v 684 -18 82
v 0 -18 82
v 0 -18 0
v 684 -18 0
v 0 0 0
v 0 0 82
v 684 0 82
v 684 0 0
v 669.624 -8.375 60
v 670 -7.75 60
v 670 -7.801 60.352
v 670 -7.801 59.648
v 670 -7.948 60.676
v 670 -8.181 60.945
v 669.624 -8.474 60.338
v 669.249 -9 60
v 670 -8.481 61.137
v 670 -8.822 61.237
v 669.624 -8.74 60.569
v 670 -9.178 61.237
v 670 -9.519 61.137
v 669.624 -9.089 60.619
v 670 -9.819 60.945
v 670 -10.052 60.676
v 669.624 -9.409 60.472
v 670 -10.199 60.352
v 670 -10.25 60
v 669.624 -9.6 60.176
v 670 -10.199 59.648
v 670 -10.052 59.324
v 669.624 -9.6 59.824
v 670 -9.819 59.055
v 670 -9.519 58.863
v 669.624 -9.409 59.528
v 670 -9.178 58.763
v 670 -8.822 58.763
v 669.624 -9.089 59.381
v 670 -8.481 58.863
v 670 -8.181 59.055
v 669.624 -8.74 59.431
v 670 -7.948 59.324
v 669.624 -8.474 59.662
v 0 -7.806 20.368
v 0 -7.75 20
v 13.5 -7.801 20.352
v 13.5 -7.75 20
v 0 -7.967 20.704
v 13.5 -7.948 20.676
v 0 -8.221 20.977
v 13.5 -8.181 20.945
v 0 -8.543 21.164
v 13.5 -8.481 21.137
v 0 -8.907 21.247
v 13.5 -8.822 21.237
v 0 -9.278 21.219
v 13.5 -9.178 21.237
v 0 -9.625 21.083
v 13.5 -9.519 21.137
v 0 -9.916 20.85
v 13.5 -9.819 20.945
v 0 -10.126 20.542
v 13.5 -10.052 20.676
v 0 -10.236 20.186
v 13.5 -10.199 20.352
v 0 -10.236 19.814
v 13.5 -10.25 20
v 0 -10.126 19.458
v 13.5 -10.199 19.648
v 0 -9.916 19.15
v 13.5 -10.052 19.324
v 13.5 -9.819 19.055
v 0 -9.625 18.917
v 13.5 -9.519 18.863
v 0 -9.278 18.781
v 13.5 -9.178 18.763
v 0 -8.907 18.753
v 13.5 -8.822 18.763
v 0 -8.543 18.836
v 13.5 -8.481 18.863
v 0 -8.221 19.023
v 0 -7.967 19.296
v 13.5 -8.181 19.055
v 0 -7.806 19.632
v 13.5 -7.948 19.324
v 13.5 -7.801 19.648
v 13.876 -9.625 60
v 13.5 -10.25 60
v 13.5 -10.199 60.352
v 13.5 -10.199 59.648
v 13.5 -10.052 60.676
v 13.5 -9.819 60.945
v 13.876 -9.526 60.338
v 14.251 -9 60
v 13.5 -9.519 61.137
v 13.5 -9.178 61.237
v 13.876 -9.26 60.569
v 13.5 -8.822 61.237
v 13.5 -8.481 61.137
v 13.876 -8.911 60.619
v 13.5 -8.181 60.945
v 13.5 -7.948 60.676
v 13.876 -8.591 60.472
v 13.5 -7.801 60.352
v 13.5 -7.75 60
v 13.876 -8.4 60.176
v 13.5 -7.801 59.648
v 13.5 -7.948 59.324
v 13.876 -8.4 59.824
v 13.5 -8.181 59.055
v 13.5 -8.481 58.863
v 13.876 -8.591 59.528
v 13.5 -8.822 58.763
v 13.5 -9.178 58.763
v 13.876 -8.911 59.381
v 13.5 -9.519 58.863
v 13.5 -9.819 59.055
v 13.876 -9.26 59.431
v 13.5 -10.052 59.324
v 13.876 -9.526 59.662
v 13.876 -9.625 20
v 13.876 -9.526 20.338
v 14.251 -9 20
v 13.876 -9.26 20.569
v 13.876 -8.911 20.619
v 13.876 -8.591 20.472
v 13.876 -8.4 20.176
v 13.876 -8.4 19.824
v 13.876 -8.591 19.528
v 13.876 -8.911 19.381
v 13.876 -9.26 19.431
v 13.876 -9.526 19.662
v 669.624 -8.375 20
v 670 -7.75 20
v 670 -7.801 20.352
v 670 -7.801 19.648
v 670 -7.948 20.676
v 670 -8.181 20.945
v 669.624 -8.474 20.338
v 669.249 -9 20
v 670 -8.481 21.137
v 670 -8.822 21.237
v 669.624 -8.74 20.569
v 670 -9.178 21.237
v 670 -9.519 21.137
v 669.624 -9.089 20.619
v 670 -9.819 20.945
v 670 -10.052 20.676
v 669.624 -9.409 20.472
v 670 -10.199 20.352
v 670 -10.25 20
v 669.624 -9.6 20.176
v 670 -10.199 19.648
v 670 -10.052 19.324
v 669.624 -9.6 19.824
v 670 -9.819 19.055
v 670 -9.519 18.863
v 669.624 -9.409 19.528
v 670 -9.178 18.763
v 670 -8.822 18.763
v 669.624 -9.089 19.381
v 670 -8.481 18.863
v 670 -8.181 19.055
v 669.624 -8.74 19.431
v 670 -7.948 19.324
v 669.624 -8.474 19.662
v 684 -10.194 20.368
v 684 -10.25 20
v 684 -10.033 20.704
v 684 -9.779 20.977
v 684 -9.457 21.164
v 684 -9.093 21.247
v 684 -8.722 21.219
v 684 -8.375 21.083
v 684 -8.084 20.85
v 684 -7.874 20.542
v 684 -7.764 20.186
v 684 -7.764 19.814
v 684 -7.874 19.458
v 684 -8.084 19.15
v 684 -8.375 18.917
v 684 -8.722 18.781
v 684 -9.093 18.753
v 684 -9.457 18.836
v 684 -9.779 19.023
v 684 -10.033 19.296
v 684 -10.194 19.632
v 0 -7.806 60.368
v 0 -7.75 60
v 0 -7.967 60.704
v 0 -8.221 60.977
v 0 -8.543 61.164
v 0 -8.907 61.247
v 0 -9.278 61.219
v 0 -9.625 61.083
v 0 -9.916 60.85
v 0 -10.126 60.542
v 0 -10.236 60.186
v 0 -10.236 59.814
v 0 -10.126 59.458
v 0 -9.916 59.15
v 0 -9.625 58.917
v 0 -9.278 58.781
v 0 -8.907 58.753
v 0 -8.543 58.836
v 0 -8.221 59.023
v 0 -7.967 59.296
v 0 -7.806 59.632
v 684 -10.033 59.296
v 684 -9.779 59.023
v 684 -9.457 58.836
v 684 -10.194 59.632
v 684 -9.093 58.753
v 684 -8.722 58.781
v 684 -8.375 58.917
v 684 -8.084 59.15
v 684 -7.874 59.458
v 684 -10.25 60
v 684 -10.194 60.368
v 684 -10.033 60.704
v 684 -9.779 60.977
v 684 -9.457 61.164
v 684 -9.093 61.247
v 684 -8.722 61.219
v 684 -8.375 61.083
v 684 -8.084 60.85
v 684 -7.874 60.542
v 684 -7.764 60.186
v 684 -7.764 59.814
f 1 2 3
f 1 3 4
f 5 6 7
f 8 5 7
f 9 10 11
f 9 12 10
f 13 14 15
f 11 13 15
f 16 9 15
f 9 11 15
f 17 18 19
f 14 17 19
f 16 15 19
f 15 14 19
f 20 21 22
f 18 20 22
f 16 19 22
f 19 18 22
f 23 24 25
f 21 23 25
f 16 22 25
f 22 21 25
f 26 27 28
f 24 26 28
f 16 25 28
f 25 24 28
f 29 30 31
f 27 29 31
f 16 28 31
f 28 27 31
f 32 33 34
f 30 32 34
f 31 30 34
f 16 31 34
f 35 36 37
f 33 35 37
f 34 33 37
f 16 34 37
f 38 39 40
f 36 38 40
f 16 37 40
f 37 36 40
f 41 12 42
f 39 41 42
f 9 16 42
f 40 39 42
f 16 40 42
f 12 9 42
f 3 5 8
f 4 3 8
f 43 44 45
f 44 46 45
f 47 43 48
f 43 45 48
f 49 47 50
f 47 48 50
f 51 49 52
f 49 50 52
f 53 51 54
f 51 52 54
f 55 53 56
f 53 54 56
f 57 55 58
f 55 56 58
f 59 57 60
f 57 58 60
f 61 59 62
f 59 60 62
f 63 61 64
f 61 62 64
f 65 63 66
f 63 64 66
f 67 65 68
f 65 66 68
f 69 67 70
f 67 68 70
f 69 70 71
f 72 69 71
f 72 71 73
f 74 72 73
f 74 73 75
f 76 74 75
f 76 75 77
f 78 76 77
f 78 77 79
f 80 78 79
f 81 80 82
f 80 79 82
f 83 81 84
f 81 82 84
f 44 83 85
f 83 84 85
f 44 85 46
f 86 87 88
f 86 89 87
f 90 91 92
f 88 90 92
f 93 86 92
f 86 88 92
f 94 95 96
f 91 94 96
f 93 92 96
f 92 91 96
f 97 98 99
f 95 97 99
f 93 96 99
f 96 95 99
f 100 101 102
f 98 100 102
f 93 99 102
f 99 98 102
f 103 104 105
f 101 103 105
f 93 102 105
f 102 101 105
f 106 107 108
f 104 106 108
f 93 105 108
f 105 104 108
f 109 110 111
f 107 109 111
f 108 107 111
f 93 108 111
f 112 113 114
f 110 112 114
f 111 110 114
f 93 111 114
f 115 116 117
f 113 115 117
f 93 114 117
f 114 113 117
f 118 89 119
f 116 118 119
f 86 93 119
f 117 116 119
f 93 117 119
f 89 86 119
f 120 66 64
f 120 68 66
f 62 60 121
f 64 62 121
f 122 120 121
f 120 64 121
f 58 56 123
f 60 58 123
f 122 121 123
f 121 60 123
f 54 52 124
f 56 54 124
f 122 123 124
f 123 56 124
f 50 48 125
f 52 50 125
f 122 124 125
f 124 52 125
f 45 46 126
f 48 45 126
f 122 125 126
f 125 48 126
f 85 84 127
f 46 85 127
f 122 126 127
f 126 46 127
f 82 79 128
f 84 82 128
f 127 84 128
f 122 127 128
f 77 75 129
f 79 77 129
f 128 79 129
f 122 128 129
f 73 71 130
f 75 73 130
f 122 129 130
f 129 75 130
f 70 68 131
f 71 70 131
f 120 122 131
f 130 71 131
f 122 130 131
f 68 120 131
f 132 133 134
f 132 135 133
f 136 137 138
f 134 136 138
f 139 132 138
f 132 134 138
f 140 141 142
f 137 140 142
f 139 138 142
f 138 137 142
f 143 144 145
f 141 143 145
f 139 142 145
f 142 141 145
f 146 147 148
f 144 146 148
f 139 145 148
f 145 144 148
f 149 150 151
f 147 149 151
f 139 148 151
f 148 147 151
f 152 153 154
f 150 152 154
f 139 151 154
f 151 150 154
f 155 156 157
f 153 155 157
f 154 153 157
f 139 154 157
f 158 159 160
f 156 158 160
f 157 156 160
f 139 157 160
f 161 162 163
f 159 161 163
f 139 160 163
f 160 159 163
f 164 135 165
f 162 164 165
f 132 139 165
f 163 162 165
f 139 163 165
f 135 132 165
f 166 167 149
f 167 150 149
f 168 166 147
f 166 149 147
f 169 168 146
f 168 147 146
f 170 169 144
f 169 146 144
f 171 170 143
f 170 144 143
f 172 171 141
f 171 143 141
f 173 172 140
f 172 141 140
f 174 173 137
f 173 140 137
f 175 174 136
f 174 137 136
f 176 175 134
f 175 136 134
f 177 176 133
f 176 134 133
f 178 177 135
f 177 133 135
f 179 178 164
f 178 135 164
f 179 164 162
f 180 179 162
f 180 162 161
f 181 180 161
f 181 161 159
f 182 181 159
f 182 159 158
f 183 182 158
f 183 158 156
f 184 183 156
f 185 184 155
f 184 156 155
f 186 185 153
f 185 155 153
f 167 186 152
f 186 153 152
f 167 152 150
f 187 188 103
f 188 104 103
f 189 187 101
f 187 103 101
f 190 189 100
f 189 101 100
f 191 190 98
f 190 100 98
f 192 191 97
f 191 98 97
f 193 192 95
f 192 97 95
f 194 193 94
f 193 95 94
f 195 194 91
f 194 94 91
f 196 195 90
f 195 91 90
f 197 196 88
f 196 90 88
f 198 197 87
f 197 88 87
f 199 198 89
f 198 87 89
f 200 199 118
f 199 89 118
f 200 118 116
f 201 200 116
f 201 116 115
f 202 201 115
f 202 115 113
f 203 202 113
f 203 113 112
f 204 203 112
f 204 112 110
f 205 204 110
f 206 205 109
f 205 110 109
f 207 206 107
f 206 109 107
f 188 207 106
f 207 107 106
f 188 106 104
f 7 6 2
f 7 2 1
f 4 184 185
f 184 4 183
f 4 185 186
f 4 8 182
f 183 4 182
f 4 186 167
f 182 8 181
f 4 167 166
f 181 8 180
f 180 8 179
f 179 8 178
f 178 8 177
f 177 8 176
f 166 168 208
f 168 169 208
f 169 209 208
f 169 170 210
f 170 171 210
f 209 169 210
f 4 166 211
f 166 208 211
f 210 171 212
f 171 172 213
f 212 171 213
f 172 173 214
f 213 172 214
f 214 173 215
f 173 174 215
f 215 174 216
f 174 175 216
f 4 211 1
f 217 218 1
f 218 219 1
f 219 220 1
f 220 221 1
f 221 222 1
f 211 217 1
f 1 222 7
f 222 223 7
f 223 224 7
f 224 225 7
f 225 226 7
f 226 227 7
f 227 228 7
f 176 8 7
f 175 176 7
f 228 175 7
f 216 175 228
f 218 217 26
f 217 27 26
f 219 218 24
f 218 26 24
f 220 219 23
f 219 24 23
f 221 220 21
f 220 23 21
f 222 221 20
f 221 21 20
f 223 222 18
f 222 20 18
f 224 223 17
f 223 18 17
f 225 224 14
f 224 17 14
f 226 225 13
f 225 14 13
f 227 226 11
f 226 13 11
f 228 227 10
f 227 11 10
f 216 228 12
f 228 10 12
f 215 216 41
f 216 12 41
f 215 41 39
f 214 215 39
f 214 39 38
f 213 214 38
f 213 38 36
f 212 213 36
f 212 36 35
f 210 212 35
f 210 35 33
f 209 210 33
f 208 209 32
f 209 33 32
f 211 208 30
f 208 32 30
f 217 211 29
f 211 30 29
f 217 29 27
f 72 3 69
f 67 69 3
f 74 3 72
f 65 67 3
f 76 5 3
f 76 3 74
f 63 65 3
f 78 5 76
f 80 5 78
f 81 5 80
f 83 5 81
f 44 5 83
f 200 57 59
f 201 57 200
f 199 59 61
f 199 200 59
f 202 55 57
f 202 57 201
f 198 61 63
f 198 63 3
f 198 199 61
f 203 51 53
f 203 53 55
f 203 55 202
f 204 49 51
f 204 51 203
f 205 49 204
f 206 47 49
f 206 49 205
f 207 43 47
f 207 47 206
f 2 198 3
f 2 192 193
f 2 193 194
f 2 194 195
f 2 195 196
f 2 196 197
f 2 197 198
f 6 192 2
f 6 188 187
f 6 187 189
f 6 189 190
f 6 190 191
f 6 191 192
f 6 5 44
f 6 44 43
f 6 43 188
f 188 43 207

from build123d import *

# Parameters (mm, degrees)
F0_W     = 684
F0_H     = 82
F1_DEPTH = 18
F3_D     = 2.5
F3_DEPTH = 13.5
F3_TIP   = 0.7510757738
F5_D     = 2.5
F5_DEPTH = 14
F5_TIP   = 0.7510757738


with BuildPart() as f1:
    # F0 (on Front) → F1 (new body)
    with BuildSketch(Plane.XZ):
        with Locations((342, 41)):
            Rectangle(F0_W, F0_H)
    extrude(amount=F1_DEPTH)

    # F3
    with Locations(Plane(origin=(0, 0, 0), x_dir=(0, -1, 0), z_dir=(-1, 0, 0))):
        with Locations((9, 20), (9, 60)):
            Hole(F3_D / 2, depth=F3_DEPTH)
            with Locations((0, 0, -(F3_DEPTH + F3_TIP / 2))):  # 118° drill point
                Cone(0, F3_D / 2, F3_TIP, mode=Mode.SUBTRACT)

    # F5
    with Locations(Plane.YZ.offset(684)):
        with Locations((-9, 20), (-9, 60)):
            Hole(F5_D / 2, depth=F5_DEPTH)
            with Locations((0, 0, -(F5_DEPTH + F5_TIP / 2))):  # 118° drill point
                Cone(0, F5_D / 2, F5_TIP, mode=Mode.SUBTRACT)


solid = f1.part
